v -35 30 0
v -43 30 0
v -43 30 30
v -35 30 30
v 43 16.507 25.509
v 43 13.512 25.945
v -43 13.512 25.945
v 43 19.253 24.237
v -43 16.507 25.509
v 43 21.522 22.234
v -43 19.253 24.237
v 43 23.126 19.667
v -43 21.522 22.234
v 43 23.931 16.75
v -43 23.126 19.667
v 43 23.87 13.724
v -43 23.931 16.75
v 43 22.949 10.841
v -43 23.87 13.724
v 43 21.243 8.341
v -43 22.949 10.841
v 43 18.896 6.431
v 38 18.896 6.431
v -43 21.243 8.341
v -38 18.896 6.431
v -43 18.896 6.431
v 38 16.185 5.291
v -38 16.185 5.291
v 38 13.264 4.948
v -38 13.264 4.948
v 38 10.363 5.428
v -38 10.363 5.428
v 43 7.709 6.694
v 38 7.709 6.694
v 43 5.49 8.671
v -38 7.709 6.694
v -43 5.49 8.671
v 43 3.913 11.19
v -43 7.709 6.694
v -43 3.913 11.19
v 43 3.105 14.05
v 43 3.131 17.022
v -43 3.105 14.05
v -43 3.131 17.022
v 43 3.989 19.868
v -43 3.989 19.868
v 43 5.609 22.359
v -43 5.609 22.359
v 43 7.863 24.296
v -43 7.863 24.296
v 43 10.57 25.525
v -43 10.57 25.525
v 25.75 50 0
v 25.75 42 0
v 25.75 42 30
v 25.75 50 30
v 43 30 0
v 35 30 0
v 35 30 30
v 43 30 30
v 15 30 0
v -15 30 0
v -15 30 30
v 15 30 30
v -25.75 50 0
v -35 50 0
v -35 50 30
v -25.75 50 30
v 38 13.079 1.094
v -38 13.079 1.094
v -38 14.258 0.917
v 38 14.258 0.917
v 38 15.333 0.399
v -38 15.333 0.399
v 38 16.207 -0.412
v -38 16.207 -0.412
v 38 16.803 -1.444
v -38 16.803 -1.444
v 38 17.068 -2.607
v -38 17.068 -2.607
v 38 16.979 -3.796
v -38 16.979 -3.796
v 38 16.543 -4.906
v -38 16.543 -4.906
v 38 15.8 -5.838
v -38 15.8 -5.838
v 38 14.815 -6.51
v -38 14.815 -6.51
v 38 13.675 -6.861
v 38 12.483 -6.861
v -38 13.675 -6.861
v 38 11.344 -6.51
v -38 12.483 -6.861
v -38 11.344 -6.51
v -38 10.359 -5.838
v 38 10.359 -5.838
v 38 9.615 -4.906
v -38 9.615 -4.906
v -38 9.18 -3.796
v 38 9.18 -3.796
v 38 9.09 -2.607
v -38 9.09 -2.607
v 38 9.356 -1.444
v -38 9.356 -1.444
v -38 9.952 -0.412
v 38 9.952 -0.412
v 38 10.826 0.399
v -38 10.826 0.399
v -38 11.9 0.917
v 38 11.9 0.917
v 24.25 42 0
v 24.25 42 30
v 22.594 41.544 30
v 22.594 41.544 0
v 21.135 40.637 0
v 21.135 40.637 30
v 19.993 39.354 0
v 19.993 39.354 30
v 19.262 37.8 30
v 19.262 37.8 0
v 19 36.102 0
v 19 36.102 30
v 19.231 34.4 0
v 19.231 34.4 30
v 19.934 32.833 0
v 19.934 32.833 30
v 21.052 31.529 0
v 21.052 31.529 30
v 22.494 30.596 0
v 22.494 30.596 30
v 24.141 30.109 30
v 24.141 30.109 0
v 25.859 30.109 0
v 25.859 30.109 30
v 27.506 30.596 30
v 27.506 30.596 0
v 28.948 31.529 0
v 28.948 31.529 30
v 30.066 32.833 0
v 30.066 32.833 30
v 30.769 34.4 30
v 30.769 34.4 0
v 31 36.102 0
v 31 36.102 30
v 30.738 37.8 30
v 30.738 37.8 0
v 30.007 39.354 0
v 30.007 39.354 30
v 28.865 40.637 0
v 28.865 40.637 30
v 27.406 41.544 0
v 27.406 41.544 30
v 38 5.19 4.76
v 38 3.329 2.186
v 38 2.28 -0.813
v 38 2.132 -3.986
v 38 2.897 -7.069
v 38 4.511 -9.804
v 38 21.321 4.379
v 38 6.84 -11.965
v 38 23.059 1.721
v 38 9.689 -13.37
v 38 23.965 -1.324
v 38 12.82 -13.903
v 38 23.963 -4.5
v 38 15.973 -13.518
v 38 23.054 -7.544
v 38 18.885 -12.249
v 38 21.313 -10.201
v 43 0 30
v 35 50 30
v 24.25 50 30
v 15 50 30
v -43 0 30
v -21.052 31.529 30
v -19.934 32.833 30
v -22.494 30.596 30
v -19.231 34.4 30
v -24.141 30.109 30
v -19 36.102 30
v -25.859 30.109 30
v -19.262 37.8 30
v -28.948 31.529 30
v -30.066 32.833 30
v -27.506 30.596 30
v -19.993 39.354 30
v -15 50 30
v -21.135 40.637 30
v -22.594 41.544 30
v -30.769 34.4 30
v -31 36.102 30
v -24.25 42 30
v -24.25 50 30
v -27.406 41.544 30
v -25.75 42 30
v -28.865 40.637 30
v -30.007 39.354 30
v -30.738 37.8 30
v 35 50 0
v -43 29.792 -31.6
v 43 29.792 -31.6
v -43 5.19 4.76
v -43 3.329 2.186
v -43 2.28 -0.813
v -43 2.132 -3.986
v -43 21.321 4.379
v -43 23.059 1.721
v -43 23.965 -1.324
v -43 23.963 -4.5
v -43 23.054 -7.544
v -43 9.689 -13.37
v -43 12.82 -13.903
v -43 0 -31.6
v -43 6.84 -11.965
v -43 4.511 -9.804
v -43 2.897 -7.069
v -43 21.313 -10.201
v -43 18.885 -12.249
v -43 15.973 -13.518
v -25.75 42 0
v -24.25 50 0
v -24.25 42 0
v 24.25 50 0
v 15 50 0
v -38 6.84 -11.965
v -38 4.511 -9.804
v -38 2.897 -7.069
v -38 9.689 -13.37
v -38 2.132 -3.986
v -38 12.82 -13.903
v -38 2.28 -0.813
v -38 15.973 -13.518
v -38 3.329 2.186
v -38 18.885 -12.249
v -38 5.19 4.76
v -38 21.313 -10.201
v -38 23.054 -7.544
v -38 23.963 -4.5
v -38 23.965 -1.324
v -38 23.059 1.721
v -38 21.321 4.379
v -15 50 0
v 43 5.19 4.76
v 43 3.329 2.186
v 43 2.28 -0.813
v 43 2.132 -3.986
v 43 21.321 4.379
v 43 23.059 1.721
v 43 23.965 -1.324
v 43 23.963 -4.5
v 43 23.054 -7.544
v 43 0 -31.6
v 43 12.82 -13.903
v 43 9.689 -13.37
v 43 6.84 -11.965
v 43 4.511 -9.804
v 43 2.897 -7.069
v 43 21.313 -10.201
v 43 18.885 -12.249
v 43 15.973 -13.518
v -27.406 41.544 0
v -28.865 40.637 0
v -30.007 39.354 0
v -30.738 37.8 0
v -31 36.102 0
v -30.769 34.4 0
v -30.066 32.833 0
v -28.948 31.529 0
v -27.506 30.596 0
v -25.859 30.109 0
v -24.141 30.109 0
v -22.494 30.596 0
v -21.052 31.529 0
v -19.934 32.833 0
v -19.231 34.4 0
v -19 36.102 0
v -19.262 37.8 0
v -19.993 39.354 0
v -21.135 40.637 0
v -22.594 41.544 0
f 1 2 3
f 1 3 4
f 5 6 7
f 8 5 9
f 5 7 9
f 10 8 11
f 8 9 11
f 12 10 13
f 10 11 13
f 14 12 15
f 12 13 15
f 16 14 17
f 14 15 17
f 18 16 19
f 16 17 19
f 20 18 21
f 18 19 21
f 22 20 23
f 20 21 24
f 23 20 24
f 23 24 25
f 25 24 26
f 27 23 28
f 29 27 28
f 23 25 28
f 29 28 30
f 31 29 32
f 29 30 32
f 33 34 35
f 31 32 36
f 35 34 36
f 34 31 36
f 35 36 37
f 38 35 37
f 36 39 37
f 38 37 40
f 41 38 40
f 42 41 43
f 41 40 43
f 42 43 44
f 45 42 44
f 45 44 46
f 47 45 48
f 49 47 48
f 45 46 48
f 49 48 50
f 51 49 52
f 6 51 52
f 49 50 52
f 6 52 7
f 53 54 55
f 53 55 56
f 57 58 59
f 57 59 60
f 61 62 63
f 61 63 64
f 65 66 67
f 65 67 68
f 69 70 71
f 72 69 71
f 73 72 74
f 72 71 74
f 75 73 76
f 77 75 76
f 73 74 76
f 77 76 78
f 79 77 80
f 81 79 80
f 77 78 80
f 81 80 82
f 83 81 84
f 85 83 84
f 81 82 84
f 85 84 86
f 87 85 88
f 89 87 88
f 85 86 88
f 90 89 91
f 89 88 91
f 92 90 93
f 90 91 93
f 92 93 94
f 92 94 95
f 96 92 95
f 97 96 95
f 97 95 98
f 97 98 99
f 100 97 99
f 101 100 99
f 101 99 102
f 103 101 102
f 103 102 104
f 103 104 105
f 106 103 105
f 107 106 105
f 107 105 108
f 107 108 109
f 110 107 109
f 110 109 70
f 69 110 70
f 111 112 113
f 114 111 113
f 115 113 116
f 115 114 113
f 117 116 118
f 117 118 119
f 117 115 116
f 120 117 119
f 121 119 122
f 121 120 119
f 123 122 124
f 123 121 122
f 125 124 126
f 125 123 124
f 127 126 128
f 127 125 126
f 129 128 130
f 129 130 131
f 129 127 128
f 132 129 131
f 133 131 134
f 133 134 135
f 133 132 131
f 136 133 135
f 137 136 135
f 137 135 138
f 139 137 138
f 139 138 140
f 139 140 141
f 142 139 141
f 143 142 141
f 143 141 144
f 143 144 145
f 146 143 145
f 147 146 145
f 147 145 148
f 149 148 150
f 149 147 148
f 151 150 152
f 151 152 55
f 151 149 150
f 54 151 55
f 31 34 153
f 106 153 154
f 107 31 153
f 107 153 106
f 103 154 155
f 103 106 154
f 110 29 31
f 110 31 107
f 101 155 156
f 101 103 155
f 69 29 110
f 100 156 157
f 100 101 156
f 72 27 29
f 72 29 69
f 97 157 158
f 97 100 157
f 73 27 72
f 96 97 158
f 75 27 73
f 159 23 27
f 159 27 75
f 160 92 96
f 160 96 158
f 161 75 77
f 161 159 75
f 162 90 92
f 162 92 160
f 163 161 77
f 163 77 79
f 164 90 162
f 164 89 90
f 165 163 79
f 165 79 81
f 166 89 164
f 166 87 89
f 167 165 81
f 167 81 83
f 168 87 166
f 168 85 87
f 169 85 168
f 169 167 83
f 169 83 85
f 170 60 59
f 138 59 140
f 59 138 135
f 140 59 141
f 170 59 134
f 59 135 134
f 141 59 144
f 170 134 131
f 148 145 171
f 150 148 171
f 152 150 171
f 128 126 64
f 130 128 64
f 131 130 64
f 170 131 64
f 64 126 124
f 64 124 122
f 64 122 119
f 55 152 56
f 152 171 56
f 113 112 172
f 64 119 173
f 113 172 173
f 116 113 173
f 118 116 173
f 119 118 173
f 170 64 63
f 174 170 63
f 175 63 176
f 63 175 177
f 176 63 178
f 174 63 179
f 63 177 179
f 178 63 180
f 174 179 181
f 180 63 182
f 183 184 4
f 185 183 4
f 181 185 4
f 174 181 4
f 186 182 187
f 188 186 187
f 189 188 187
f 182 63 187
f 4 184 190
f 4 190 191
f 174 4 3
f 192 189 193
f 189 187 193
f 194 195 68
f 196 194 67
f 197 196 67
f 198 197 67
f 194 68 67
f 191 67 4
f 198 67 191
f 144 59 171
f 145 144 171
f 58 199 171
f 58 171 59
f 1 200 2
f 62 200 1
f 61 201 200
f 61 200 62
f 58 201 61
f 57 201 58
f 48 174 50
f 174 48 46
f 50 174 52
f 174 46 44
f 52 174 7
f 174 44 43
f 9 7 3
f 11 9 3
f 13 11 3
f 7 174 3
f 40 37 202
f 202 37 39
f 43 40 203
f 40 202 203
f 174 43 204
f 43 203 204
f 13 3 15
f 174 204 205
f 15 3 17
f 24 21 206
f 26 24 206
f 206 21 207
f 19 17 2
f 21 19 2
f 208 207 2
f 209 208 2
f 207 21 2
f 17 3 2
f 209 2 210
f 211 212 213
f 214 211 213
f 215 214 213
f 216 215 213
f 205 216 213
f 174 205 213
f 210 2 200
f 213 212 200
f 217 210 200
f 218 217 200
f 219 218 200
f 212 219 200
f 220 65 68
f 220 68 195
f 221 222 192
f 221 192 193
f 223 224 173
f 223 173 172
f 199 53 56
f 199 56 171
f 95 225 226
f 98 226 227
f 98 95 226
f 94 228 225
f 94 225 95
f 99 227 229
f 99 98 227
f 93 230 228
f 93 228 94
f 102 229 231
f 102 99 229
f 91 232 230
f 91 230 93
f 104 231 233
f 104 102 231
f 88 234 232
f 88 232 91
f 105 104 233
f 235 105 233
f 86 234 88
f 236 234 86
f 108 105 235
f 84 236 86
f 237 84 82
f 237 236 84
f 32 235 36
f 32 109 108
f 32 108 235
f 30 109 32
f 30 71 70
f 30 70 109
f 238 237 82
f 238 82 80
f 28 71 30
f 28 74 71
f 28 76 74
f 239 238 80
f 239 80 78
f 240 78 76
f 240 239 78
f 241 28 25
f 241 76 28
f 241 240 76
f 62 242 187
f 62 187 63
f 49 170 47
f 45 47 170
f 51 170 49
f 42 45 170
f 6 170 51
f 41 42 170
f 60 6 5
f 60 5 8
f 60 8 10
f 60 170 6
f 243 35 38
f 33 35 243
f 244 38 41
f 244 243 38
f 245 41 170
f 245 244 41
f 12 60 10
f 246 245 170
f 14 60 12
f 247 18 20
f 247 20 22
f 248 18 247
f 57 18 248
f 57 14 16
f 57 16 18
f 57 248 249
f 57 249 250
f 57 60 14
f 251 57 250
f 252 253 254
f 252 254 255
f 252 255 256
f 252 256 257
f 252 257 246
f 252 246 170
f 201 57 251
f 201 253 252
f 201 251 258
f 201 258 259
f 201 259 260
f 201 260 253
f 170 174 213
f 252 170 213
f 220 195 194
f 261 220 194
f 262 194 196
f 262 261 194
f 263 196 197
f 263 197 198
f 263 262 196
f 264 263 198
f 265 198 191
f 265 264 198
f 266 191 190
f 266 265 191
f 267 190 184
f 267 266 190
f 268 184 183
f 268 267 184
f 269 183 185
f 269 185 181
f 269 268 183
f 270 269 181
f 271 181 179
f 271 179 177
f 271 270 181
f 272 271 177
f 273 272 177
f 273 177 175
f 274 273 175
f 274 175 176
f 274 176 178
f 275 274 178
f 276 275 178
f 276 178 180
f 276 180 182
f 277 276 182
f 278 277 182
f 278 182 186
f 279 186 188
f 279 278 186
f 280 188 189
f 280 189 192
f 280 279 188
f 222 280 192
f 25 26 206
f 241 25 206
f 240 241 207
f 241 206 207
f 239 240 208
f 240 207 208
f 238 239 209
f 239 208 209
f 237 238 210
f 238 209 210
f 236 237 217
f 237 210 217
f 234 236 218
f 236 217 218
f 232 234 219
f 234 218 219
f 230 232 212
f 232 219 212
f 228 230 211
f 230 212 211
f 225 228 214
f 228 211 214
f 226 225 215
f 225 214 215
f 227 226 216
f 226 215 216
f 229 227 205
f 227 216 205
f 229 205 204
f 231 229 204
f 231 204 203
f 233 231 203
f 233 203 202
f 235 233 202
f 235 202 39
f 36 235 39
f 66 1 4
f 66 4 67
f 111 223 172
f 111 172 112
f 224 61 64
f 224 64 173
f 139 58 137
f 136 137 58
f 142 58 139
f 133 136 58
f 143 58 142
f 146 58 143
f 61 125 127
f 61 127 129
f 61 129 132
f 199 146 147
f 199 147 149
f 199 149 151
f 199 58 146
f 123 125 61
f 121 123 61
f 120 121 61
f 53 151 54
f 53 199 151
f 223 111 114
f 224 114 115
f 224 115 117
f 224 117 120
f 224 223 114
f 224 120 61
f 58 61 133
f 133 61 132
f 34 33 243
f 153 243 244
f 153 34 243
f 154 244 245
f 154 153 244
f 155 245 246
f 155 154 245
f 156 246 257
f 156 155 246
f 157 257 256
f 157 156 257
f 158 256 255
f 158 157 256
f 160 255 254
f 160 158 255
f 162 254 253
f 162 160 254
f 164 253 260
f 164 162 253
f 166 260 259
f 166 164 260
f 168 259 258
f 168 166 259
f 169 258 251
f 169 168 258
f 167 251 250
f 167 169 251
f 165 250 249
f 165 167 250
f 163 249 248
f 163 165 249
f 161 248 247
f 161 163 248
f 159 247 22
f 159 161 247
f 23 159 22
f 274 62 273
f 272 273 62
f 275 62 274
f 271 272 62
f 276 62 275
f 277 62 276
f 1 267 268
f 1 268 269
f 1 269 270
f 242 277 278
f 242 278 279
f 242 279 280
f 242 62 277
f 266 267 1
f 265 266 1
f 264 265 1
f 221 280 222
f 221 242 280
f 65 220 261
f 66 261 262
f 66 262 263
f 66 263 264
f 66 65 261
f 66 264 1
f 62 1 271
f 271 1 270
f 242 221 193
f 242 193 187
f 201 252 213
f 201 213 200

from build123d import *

# Parameters (mm, degrees)
EXTRUDE_1_DEPTH     = 30
SKETCH_2_R          = 10.5
CUT_EXTRUDE_1_DEPTH = 104.903801663
EXTRUDE_3_DEPTH     = 86
SKETCH_5_R          = 4
CUT_EXTRUDE_3_DEPTH = 86
SKETCH_6_R          = 11
CUT_EXTRUDE_4_DEPTH = 5
CUT_EXTRUDE_START   = -5
SKETCH_7_R          = 11
CUT_EXTRUDE_5_DEPTH = 5


with BuildPart() as part:
    # Эскиз1 → Бобышка-Вытянуть1 (new body)
    with BuildSketch(Plane.XY):
        with BuildLine():
            Line((-43, 0), (-43, 30))
            Line((-43, 30), (-35, 30))
            Line((-35, 30), (-35, 50))
            Line((-35, 50), (-25.75, 50))
            Line((-25.75, 50), (-25.75, 42))
            ThreePointArc((-25.75, 42), (-25, 30.04705955), (-24.25, 42))
            Line((-24.25, 42), (-24.25, 50))
            Line((-24.25, 50), (-15, 50))
            Line((-15, 50), (-15, 30))
            Line((-15, 30), (0, 30))
            Line((0, 30), (15, 30))
            Line((15, 30), (15, 50))
            Line((15, 50), (24.25, 50))
            Line((24.25, 50), (24.25, 42))
            ThreePointArc((24.25, 42), (25, 30.04705955), (25.75, 42))
            Line((25.75, 42), (25.75, 50))
            Line((25.75, 50), (35, 50))
            Line((35, 50), (35, 30))
            Line((35, 30), (43, 30))
            Line((43, 30), (43, 0))
            Line((43, 0), (0, 0))
            Line((0, 0), (-43, 0))
        make_face()
    extrude(amount=EXTRUDE_1_DEPTH)

    # Эскиз2 → Вырез-Вытянуть1 (cut, through all)
    with BuildSketch(Plane.ZY.offset(43)):
        with Locations((15.445285693, 13.511926699)):
            Circle(SKETCH_2_R)
    extrude(amount=-CUT_EXTRUDE_1_DEPTH, mode=Mode.SUBTRACT)

    # Эскиз4 → Бобышка-Вытянуть3 (add)
    with BuildSketch(Plane(origin=(43, 0, 0), x_dir=(0, 0, -1), z_dir=(1, 0, 0))):
        Polygon((0, 0), (31.600345964, 0), (31.600345964, 29.791908919), (0, 30), align=None)
    extrude(amount=-EXTRUDE_3_DEPTH)

    # Эскиз5 → Вырез-Вытянуть3 (cut)
    with BuildSketch(Plane.ZY.offset(43)):
        with Locations((-2.905780264, 13.079264153)):
            Circle(SKETCH_5_R)
    extrude(amount=-CUT_EXTRUDE_3_DEPTH, mode=Mode.SUBTRACT)

    # Эскиз6 → Вырез-Вытянуть4 (cut)
    with BuildSketch(Plane.ZY.offset(43)):
        with Locations((-2.905780264, 13.079264153)):
            Circle(SKETCH_6_R)
    extrude(amount=-CUT_EXTRUDE_4_DEPTH, mode=Mode.SUBTRACT)

    # Эскиз7 → Вырез-Вытянуть5 (cut)
    with BuildSketch(Plane(origin=(43, 0, 0), x_dir=(0, 0, -1), z_dir=(1, 0, 0)).offset(CUT_EXTRUDE_START)):
        with Locations((2.905780264, 13.079264153)):
            Circle(SKETCH_7_R)
    extrude(amount=CUT_EXTRUDE_5_DEPTH, mode=Mode.SUBTRACT)


solid = part.part
